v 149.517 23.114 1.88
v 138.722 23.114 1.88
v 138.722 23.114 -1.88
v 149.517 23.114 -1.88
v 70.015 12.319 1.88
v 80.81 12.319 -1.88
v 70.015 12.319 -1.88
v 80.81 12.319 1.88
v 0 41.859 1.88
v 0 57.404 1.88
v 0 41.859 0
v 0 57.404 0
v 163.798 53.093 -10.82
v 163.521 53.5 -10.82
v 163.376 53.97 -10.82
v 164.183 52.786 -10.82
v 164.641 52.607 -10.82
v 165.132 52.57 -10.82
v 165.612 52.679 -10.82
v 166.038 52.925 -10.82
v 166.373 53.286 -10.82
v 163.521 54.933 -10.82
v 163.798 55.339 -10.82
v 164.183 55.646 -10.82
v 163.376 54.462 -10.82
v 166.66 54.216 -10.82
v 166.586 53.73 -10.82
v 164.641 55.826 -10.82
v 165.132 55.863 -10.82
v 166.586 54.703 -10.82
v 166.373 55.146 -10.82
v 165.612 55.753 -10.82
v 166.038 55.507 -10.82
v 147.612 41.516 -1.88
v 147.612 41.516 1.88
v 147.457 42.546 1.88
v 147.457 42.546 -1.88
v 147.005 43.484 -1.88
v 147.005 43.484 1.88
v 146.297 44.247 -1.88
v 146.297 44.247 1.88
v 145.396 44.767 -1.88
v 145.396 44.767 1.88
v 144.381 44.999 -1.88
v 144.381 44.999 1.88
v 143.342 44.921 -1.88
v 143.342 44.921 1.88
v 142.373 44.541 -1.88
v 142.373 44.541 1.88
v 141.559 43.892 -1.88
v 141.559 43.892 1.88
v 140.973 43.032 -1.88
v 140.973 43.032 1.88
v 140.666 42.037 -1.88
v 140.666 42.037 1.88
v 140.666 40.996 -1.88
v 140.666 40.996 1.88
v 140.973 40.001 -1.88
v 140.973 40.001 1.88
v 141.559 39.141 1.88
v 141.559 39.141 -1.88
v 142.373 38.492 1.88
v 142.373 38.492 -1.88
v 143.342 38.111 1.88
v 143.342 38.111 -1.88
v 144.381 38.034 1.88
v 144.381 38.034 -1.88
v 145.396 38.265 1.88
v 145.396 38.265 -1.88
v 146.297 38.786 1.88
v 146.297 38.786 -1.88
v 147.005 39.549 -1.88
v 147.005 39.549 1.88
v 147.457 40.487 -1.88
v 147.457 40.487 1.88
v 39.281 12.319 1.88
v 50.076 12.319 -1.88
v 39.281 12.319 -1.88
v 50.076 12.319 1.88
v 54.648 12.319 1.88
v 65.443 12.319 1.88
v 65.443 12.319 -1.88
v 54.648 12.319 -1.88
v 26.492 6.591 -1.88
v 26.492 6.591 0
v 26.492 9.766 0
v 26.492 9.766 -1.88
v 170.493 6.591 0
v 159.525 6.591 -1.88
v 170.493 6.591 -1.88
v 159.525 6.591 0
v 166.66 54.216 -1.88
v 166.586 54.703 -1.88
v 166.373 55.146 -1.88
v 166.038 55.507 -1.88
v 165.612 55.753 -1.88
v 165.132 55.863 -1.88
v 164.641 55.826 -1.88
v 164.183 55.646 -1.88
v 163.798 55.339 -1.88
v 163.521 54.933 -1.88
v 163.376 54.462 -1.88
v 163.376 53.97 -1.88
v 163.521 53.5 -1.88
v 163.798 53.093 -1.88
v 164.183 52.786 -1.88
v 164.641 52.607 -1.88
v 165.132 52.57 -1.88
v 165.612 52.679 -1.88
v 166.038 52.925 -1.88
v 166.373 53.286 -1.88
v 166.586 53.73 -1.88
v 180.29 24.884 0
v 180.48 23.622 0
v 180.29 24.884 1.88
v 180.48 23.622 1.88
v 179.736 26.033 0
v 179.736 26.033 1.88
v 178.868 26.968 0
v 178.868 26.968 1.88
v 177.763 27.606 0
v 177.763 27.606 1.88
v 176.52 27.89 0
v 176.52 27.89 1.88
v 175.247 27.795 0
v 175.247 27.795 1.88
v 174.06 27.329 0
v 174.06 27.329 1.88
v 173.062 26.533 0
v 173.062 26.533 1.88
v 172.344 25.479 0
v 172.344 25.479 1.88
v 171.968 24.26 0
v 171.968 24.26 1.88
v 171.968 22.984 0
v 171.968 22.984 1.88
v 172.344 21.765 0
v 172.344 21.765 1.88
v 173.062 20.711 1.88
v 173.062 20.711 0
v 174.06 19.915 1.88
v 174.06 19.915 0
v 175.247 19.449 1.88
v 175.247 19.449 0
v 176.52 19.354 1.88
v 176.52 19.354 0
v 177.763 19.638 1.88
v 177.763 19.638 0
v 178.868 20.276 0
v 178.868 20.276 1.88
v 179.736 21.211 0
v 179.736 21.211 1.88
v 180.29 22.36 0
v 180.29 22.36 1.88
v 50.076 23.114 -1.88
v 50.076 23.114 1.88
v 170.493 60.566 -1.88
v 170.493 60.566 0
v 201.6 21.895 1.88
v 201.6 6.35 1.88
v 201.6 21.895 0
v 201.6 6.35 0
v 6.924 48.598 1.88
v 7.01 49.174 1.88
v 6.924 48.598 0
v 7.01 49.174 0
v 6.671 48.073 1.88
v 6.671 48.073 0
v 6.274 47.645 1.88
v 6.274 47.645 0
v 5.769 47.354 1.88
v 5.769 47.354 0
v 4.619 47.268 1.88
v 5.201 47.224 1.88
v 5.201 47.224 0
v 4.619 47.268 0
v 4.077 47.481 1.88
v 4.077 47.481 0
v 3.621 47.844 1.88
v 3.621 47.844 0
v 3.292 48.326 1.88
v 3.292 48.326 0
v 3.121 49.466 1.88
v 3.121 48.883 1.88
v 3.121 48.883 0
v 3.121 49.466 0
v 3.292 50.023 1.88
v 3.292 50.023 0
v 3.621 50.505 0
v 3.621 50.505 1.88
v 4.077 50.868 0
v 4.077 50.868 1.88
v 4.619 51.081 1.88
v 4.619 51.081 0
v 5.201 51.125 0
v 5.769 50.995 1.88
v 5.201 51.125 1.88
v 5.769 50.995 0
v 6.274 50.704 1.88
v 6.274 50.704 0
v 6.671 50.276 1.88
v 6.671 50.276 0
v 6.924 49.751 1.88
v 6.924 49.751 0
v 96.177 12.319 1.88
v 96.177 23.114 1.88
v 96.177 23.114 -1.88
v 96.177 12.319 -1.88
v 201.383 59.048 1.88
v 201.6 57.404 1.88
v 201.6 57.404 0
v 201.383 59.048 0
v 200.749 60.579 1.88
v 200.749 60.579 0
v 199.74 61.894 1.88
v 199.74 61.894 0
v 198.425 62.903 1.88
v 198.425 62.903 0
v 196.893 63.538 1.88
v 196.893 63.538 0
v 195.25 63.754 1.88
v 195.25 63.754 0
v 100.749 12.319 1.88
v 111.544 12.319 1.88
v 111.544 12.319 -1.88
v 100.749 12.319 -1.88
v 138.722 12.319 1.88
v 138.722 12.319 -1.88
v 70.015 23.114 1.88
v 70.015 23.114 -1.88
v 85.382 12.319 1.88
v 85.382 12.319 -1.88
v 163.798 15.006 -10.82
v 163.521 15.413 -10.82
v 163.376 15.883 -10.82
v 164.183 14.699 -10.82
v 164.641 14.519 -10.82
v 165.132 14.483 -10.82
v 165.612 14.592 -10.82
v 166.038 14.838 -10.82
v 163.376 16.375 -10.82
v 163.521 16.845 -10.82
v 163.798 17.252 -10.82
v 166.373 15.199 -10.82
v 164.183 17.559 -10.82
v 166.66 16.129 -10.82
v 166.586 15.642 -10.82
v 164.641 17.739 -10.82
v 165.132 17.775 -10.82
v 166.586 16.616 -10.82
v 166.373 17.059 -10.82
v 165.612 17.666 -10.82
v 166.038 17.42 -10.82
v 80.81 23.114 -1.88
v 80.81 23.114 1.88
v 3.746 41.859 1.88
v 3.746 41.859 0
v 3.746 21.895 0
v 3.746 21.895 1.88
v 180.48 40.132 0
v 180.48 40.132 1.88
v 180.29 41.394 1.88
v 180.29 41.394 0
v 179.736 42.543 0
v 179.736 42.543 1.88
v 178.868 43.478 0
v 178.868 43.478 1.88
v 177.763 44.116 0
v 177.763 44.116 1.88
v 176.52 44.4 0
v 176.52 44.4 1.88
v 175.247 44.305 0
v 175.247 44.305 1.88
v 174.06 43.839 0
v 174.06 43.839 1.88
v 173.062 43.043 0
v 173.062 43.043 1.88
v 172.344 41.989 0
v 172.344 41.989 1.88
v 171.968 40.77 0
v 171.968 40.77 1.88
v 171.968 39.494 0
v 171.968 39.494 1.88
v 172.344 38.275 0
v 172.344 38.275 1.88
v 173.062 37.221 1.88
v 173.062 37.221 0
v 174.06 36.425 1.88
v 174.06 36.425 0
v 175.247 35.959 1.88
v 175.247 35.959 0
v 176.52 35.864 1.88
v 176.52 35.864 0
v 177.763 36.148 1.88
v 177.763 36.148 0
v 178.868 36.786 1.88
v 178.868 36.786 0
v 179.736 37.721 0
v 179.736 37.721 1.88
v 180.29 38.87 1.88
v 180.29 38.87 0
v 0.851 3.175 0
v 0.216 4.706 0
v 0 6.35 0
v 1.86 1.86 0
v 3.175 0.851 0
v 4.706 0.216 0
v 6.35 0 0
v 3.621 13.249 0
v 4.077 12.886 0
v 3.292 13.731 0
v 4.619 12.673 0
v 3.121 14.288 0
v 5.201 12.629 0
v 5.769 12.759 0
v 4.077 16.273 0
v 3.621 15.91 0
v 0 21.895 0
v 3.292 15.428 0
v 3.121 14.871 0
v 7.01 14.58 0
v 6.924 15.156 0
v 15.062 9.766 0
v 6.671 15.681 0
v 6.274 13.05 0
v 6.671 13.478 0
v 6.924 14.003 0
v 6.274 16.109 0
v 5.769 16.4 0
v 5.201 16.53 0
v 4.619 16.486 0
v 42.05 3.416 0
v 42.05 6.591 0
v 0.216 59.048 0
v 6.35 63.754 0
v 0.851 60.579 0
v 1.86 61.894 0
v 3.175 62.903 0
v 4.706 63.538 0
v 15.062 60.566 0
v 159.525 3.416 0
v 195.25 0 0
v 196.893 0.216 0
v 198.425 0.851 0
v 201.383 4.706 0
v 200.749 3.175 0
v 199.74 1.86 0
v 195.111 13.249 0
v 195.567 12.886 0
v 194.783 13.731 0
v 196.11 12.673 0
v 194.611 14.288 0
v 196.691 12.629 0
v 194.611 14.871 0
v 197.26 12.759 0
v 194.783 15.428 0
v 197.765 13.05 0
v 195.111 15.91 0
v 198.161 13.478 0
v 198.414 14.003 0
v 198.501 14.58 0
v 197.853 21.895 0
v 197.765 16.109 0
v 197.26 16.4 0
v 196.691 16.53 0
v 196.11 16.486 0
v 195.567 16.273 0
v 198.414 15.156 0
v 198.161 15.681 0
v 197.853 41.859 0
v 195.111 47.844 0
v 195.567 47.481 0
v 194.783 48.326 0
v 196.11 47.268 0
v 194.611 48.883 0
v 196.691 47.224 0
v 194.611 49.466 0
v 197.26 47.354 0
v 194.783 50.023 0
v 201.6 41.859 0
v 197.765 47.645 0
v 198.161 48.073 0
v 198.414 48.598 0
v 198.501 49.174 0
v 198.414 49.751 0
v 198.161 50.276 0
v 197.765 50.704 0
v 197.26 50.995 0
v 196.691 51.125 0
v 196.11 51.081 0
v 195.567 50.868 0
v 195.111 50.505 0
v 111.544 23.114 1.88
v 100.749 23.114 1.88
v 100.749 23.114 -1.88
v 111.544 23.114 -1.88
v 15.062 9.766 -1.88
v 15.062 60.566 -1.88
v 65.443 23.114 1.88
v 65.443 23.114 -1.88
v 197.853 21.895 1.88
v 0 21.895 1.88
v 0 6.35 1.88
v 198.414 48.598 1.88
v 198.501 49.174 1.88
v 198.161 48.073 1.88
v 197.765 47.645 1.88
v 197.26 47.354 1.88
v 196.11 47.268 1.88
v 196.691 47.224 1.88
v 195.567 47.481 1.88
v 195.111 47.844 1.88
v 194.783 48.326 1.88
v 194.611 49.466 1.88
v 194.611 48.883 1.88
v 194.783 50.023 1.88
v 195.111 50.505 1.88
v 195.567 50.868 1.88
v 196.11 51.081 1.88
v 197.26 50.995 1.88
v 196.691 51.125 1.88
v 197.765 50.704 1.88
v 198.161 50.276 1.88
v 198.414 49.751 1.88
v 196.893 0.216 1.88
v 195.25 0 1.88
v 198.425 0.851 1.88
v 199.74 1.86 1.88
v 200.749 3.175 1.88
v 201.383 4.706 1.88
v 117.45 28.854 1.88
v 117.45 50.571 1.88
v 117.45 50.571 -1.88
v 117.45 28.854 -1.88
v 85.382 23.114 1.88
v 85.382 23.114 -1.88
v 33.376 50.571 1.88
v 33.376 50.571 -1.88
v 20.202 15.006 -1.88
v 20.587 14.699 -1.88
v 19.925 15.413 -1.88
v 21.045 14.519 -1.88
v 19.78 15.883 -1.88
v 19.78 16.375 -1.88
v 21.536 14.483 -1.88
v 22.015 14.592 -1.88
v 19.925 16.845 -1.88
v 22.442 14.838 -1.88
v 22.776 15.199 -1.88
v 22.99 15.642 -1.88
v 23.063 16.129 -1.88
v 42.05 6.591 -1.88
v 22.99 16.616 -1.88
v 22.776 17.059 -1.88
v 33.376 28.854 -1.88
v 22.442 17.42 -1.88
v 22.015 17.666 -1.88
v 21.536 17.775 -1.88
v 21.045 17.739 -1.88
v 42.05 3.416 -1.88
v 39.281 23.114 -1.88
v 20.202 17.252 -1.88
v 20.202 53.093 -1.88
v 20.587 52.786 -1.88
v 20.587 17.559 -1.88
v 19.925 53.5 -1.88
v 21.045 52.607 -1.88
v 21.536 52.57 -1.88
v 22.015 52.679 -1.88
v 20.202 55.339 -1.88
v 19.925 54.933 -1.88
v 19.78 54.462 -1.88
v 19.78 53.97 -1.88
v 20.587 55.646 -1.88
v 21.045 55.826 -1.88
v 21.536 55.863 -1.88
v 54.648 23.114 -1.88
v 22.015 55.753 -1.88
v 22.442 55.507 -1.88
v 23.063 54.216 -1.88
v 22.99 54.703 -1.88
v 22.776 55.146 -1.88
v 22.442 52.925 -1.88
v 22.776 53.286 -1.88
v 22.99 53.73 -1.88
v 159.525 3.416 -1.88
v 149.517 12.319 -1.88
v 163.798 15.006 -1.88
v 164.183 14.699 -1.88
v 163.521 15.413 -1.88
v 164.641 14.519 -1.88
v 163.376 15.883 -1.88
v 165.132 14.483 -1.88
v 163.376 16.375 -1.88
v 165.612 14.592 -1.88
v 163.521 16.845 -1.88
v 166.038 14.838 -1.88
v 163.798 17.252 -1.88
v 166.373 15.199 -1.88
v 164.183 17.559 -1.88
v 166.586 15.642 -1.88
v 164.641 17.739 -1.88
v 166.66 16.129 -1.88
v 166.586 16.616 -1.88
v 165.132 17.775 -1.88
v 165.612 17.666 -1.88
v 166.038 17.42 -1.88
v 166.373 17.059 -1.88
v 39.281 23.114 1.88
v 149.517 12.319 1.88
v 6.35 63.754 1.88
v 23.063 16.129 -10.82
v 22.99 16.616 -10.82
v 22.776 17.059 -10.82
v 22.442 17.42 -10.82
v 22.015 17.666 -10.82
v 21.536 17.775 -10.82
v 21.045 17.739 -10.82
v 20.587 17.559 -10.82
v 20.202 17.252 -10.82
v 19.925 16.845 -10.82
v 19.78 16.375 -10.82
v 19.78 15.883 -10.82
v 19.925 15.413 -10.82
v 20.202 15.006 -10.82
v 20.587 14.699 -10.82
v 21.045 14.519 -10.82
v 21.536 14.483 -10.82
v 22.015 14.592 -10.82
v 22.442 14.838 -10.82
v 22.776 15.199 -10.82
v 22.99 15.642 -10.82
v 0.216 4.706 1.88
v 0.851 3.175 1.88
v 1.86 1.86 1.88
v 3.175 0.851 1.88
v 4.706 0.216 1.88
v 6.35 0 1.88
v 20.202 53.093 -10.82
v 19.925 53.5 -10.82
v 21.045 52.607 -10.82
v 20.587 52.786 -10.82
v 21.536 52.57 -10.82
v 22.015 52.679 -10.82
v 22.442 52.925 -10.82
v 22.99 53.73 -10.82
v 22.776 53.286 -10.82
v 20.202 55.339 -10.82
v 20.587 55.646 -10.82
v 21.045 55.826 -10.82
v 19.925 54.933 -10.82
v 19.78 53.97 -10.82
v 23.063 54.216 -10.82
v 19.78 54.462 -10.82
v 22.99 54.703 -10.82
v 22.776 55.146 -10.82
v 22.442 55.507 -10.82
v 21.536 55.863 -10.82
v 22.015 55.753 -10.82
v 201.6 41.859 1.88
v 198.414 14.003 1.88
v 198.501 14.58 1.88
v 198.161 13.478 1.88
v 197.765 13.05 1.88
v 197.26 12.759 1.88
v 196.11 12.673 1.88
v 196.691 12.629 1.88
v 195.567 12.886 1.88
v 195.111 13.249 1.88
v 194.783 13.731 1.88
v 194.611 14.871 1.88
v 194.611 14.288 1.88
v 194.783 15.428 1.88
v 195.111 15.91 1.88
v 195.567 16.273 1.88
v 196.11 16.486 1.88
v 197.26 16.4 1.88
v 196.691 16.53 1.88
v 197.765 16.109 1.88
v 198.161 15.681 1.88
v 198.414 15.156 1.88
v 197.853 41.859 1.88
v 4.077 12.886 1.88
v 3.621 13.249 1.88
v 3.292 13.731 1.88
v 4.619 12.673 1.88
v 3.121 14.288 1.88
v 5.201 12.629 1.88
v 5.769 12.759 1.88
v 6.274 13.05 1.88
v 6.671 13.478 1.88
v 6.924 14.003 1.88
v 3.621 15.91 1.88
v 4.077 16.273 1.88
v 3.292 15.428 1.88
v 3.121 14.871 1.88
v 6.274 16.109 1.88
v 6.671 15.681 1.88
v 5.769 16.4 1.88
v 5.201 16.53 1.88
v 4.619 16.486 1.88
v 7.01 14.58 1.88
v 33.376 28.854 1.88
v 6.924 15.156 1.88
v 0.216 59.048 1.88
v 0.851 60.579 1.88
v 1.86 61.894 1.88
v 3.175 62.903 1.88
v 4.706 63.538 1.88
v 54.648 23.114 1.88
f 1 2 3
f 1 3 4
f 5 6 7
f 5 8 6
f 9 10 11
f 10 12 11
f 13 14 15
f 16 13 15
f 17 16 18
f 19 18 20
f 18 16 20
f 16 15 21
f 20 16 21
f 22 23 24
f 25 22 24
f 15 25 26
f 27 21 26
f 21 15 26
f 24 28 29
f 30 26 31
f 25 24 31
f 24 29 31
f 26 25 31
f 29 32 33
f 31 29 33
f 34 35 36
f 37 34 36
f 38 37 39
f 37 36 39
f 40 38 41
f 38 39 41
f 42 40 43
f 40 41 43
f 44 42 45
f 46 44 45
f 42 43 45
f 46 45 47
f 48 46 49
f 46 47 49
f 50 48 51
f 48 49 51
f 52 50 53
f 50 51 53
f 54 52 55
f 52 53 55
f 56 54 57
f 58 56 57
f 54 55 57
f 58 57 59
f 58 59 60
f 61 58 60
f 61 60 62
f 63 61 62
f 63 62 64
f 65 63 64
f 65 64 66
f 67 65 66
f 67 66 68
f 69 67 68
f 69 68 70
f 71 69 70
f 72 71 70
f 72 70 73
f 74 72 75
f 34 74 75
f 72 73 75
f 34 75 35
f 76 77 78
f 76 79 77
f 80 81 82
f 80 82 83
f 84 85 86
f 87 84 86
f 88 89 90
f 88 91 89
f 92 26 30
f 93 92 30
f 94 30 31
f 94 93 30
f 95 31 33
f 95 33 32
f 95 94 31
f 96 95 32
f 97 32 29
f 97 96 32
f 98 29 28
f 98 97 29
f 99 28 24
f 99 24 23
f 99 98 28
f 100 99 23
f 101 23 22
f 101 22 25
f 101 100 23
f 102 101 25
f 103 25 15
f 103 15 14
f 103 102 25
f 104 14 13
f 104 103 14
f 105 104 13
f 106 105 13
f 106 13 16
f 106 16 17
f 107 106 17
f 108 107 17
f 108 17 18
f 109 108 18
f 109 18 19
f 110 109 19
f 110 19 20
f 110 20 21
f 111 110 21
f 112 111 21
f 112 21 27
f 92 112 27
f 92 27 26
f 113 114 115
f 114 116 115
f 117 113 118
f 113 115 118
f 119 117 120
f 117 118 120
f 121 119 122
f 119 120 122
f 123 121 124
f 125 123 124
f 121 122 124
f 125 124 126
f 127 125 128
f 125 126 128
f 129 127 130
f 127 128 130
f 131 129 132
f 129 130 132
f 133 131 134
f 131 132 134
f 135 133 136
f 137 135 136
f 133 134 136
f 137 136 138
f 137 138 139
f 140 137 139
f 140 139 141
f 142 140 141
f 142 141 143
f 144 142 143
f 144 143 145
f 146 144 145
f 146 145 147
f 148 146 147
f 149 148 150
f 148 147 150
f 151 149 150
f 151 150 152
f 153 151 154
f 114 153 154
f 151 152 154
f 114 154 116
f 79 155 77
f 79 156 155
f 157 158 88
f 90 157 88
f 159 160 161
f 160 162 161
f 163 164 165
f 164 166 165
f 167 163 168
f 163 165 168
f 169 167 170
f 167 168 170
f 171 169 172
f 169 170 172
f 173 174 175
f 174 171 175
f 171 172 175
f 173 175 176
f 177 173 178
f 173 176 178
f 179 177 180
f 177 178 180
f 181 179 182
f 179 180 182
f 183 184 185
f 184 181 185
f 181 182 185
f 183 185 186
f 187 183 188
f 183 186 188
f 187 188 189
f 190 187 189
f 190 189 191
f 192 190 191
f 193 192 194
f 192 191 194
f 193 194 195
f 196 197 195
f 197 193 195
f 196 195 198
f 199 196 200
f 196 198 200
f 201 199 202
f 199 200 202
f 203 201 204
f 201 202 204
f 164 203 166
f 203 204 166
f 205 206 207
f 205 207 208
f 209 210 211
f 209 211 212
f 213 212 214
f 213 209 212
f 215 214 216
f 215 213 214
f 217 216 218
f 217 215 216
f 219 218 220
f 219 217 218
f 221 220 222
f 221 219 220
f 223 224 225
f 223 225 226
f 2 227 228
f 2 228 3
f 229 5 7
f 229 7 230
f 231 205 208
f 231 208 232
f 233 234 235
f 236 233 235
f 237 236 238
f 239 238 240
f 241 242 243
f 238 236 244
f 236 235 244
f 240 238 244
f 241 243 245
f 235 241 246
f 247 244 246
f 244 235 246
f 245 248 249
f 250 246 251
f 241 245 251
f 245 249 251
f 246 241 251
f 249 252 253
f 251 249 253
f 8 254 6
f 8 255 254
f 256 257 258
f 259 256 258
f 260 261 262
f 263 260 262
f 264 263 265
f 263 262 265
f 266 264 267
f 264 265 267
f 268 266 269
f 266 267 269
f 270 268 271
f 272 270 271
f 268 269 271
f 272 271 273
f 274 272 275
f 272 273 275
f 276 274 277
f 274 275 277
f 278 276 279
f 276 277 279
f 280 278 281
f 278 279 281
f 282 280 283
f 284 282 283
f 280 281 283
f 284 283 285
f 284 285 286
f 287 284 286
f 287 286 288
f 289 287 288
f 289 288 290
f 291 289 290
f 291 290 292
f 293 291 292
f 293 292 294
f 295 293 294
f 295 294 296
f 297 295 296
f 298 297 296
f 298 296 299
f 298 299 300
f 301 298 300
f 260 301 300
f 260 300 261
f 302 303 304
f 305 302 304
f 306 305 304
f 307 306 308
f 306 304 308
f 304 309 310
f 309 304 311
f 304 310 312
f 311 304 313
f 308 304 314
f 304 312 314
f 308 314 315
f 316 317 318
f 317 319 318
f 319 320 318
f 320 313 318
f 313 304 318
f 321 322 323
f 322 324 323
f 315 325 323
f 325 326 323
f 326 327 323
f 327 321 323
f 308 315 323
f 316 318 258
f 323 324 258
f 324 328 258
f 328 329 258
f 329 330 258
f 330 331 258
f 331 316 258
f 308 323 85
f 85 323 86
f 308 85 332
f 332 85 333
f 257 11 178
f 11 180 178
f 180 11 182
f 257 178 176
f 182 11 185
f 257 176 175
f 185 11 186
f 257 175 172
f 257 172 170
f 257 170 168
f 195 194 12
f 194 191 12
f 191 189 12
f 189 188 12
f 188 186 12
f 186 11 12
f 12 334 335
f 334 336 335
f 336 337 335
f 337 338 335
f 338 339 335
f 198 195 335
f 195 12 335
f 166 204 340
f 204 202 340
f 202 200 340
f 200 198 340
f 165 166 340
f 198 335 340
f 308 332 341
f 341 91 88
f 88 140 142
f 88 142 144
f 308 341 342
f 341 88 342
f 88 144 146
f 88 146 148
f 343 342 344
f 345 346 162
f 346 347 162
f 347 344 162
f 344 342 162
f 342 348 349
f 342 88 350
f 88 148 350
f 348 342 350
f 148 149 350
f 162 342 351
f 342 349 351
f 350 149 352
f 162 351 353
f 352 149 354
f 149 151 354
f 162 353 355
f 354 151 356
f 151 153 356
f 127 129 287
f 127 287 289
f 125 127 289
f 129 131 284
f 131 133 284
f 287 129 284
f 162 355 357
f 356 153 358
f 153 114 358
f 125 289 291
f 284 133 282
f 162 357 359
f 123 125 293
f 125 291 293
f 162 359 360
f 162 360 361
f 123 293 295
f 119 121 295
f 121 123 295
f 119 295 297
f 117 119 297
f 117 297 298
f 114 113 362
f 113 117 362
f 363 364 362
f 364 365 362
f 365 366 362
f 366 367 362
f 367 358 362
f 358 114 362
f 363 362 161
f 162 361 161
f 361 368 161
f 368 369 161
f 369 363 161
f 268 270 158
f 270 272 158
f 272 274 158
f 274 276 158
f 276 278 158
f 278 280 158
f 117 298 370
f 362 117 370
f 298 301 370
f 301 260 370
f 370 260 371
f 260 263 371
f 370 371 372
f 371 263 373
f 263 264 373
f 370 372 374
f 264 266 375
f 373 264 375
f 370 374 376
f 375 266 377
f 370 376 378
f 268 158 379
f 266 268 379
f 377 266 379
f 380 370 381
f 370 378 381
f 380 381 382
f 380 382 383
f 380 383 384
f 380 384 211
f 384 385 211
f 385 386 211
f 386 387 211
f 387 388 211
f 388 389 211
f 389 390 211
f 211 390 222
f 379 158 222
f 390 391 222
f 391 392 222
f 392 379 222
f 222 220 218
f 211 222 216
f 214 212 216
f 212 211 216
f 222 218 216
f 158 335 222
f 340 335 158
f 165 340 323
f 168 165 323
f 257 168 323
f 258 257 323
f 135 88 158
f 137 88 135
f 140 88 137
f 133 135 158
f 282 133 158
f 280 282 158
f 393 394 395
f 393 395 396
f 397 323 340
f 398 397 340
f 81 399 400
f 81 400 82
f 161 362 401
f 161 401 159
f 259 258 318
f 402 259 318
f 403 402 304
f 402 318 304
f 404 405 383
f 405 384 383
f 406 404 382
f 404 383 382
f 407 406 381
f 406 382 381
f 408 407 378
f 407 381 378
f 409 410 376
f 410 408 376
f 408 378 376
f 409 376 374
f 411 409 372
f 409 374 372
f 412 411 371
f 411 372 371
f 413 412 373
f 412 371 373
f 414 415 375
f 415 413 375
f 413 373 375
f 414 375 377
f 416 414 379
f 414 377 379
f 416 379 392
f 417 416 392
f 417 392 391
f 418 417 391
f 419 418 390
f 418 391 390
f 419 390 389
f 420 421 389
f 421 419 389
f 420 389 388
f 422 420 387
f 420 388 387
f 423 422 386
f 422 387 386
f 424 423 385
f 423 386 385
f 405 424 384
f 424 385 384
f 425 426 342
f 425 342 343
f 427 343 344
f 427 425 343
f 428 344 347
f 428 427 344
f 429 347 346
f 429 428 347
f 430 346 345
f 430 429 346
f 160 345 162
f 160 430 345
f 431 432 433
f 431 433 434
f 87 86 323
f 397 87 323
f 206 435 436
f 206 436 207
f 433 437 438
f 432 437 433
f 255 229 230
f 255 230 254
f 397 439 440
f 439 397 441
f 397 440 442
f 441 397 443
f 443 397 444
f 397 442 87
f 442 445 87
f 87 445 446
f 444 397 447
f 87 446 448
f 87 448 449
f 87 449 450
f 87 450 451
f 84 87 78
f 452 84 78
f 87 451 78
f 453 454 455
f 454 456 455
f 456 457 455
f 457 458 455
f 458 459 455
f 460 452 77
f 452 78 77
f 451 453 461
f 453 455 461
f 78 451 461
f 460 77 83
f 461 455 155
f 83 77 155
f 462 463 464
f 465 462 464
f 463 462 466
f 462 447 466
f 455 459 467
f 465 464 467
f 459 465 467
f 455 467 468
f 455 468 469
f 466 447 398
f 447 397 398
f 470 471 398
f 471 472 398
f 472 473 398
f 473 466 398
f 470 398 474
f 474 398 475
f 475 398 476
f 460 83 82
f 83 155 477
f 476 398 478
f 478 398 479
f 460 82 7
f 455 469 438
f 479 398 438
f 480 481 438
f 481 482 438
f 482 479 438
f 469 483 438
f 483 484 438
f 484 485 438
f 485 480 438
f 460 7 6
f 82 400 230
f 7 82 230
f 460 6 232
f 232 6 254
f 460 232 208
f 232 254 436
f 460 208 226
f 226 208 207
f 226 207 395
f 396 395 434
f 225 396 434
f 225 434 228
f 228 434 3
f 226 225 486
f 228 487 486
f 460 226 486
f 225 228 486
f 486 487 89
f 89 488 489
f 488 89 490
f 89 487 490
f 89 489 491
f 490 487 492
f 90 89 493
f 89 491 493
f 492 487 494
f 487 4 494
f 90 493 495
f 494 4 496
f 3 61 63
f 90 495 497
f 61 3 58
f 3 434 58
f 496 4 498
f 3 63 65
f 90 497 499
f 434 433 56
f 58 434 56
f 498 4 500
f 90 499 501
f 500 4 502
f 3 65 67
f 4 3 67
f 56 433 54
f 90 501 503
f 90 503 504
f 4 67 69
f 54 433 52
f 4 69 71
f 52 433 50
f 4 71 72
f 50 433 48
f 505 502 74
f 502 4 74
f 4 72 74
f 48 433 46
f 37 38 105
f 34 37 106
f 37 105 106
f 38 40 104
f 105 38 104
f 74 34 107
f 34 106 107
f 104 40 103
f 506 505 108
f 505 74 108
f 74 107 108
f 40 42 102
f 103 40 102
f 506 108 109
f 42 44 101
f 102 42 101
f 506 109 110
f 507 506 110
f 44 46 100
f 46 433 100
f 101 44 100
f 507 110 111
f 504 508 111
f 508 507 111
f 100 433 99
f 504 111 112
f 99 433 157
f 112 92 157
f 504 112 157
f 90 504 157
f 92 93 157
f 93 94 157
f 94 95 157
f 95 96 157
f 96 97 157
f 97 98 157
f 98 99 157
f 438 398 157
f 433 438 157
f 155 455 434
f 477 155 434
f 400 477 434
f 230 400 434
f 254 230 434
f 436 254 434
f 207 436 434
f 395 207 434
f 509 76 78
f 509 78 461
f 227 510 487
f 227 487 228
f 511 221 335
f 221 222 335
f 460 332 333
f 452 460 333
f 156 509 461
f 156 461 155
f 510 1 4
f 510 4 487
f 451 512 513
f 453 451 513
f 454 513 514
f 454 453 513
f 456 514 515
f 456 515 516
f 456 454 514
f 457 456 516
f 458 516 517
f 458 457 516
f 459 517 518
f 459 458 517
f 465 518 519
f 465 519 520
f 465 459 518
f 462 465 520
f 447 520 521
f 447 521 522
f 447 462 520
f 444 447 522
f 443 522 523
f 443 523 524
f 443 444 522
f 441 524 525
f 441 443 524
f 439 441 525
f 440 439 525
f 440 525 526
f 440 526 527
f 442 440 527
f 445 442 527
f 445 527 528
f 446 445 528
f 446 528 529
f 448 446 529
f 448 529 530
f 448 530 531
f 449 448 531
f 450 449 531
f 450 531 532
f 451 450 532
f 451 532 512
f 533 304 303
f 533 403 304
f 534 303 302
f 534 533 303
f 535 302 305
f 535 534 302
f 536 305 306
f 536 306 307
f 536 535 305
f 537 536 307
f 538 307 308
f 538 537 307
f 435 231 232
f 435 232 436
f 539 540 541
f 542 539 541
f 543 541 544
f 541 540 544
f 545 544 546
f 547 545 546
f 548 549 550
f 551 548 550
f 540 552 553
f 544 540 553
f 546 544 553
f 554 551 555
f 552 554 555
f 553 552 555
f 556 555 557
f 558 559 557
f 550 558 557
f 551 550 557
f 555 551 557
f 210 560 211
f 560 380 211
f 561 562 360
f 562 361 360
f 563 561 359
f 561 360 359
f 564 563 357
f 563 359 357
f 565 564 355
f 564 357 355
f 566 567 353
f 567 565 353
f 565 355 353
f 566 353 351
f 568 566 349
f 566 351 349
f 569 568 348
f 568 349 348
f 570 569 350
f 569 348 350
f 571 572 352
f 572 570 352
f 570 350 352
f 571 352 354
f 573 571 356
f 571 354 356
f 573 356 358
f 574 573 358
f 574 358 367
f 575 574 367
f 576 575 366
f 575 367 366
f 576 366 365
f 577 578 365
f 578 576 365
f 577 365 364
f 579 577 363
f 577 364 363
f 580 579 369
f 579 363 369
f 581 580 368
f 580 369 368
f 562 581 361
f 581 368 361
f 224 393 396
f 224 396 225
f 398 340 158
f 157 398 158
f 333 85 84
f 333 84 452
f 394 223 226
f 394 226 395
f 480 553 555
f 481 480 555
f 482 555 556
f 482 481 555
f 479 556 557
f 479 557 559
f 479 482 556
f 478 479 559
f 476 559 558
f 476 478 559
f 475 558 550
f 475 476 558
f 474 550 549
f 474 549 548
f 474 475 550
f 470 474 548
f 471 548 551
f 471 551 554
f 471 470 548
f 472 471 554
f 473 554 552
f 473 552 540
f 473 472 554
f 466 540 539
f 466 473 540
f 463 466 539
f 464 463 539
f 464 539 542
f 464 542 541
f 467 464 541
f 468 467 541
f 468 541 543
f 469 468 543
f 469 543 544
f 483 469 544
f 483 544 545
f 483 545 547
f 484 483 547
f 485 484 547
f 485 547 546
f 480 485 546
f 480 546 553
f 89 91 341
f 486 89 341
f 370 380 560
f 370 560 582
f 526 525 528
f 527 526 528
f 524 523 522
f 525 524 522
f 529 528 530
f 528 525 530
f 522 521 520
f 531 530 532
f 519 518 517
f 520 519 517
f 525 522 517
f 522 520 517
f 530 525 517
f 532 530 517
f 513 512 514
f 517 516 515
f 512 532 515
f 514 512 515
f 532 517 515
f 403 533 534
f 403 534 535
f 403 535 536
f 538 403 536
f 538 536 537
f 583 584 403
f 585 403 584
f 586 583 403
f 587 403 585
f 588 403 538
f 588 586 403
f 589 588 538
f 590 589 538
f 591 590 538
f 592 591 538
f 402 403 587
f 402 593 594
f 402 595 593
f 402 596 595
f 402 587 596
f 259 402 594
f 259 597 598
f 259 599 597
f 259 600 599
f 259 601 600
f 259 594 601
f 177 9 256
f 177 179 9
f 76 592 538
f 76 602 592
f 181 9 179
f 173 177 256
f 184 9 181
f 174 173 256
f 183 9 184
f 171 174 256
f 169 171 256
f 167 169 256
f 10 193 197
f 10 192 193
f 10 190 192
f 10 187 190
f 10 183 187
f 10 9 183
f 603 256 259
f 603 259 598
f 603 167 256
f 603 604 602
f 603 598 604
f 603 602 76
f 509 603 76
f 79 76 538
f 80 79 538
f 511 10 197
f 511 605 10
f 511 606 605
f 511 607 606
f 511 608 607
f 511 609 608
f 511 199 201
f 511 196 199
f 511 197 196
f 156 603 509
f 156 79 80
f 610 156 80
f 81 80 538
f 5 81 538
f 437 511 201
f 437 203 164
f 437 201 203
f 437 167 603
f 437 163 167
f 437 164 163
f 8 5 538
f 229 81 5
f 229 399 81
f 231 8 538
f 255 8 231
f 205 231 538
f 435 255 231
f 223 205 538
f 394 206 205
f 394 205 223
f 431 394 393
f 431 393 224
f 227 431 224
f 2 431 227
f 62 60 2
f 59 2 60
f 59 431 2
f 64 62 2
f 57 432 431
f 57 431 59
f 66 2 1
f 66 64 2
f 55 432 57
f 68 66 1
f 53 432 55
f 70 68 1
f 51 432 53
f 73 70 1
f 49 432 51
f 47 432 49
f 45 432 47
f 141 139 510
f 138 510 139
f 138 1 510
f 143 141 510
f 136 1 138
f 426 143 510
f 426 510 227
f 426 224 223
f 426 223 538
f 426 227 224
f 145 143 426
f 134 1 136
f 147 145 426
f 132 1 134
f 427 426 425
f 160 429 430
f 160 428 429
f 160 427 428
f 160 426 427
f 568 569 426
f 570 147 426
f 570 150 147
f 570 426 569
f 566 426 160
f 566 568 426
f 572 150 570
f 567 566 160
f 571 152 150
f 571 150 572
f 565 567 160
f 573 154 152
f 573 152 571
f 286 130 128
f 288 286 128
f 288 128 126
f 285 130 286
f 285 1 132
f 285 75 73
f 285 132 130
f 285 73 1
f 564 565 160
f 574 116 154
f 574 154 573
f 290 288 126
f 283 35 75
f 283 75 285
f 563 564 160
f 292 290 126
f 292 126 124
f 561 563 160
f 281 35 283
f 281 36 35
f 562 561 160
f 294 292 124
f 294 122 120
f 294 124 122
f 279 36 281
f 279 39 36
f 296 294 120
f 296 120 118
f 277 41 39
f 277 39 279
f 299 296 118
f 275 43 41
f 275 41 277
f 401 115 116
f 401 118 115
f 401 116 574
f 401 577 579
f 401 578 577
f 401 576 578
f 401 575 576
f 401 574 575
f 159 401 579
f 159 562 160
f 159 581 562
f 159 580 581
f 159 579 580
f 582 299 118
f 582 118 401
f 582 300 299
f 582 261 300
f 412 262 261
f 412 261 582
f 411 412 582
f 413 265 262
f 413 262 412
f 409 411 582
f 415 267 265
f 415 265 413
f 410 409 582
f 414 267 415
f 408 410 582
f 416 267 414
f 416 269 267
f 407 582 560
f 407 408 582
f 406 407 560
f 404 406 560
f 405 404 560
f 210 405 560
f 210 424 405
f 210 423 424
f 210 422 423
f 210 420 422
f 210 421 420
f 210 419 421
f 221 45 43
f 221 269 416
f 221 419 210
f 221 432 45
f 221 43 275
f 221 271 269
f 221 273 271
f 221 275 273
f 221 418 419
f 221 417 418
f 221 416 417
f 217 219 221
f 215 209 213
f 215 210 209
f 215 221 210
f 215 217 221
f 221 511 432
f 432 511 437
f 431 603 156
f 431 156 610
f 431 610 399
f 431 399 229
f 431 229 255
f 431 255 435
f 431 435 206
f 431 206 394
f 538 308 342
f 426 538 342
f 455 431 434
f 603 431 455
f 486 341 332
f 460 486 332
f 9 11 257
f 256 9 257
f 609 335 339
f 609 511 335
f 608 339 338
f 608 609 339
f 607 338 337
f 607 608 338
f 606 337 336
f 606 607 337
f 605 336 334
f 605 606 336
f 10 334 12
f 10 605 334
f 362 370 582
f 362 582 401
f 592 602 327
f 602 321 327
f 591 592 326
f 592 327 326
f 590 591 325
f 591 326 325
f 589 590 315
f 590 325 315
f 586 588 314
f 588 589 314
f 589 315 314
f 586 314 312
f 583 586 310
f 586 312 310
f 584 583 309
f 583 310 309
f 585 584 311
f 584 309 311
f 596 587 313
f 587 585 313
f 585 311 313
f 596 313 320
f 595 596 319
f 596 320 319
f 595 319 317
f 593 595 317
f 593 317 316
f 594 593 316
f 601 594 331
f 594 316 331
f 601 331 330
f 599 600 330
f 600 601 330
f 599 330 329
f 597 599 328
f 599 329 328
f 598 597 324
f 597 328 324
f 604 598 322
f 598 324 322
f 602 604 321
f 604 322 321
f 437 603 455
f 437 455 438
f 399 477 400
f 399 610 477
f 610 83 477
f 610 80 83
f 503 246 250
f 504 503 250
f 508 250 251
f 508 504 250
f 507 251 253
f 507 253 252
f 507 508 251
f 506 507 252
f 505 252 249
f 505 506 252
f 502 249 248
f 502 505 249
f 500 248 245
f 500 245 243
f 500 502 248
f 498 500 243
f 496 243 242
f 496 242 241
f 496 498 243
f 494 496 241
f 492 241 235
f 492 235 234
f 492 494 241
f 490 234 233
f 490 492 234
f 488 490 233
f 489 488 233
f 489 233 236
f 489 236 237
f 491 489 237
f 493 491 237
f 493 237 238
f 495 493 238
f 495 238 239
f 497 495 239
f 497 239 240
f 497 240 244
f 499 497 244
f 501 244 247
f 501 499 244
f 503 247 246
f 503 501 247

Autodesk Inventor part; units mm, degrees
ref_plane "YZ Plane" through (0, 0, 0) normal (1, 0, 0) x (0, 1, 0)
ref_plane "XZ Plane" through (0, 0, 0) normal (0, 1, 0) x (-1, 0, 0)
ref_plane "XY Plane" through (0, 0, 0) normal (0, 0, 1) x (1, 0, 0)
sketch "Sketch1" plane through (0, 0, 0) normal (0, 0, 1) x (1, 0, 0)
  line L0 (0, 0) -> (201.5998, 0)
  line L1 (201.5998, 0) -> (201.5998, 63.754)
  line L2 (201.5998, 63.754) -> (0, 63.754)
  line L3 (0, 63.754) -> (0, 0)
  line L4 (0, 41.8592) -> (3.7465, 41.8592)
  line L5 (3.7465, 41.8592) -> (3.7465, 21.8948)
  line L6 (3.7465, 21.8948) -> (0, 21.8948)
  line L7 (0, 21.8948) -> (0, 41.8592)
  line L8 (201.5998, 41.8592) -> (197.8533, 41.8592)
  line L9 (197.8533, 41.8592) -> (197.8533, 21.8948)
  line L10 (197.8533, 21.8948) -> (201.5998, 21.8948)
  line L11 (201.5998, 21.8948) -> (201.5998, 41.8592)
  circle A0 centre (5.0546, 49.1744) radius 1.9558
  circle A1 centre (5.0546, 14.5796) radius 1.9558
  circle A2 centre (196.5452, 14.5796) radius 1.9558
  circle A3 centre (196.5452, 49.1744) radius 1.9558
  dimension "d0" = 201.5998
  dimension "d1" = 63.754
  dimension "d2" = 3.7465
  dimension "d3" = 19.9644
  dimension "d4" = 21.8948
  dimension "d5" = 3.7465
  dimension "d6" = 3.9116
  dimension "d7" = 12.6238
  dimension "d8" = 3.0988
  dimension "d9" = 3.9116
  dimension "d10" = 12.6238
  dimension "d11" = 3.0988
  dimension "d12" = 3.9116
  dimension "d13" = 3.0988
extrude "Extrusion1" add sketch "Sketch1" along normal blind 1.8796 contours L3 L6 L5 L4 L2 L1 L8 L9 L10 L0
fillet "Fillet1" radius 6.35 4 edges at (201.5998, 63.754, 0.9398) (201.5998, 0, 0.9398) (0, 63.754, 0.9398) (0, 0, 0.9398)
sketch "Sketch2" plane through (0, 0, 1.8796) normal (0, 0, 1) x (1, 0, 0)
  arc A0 (0, 6.35) -> (6.35, 0) centre (6.35, 6.35) ccw projected
  line L0 (6.35, 0) -> (195.2498, 0) projected
  arc A1 (195.2498, 0) -> (201.5998, 6.35) centre (195.2498, 6.35) ccw projected
  line L1 (201.5998, 6.35) -> (201.5998, 21.8948) projected
  line L2 (201.5998, 21.8948) -> (197.8533, 21.8948) projected
  line L3 (197.8533, 21.8948) -> (197.8533, 41.8592) projected
  line L4 (197.8533, 41.8592) -> (201.5998, 41.8592) projected
  line L5 (201.5998, 41.8592) -> (201.5998, 57.404) projected
  arc A2 (201.5998, 57.404) -> (195.2498, 63.754) centre (195.2498, 57.404) ccw projected
  line L6 (195.2498, 63.754) -> (6.35, 63.754) projected
  arc A3 (6.35, 63.754) -> (0, 57.404) centre (6.35, 57.404) ccw projected
  line L7 (0, 57.404) -> (0, 41.8592) projected
  line L8 (0, 41.8592) -> (3.7465, 41.8592) projected
  line L9 (3.7465, 41.8592) -> (3.7465, 21.8948) projected
  line L10 (3.7465, 21.8948) -> (0, 21.8948) projected
  line L11 (0, 21.8948) -> (0, 6.35) projected
  circle A4 centre (196.5452, 49.1744) radius 1.9558 projected
  circle A5 centre (196.5452, 14.5796) radius 1.9558 projected
  circle A6 centre (5.0546, 14.5796) radius 1.9558 projected
  circle A7 centre (5.0546, 49.1744) radius 1.9558 projected
  line L12 (15.0622, 60.5663) -> (170.4927, 60.5663)
  line L13 (170.4927, 60.5663) -> (170.4927, 9.7663)
  line L14 (15.0622, 9.7663) -> (15.0622, 60.5663)
  line L15 (170.4927, 9.7663) -> (170.4927, 6.5913)
  line L16 (26.4922, 6.5913) -> (26.4922, 9.7663)
  line L17 (159.5247, 6.5913) -> (159.5247, 3.4163)
  line L18 (159.5247, 3.4163) -> (42.0497, 3.4163)
  line L19 (42.0497, 3.4163) -> (42.0497, 6.5913)
  circle A8 centre (21.4122, 54.2163) radius 1.651
  circle A9 centre (21.4122, 16.129) radius 1.651
  circle A10 centre (165.0087, 16.129) radius 1.651
  circle A11 centre (165.0087, 54.2163) radius 1.651
  line L20 (33.3756, 50.5714) -> (117.4496, 50.5714)
  line L21 (117.4496, 50.5714) -> (117.4496, 28.8544)
  line L22 (117.4496, 28.8544) -> (33.3756, 28.8544)
  line L23 (33.3756, 28.8544) -> (33.3756, 50.5714)
  line L24 (39.2811, 23.114) -> (50.0761, 23.114)
  line L25 (50.0761, 23.114) -> (50.0761, 12.319)
  line L26 (50.0761, 12.319) -> (39.2811, 12.319)
  line L27 (39.2811, 12.319) -> (39.2811, 23.114)
  line L28 (54.6481, 23.114) -> (65.4431, 23.114)
  line L29 (65.4431, 23.114) -> (65.4431, 12.319)
  line L30 (65.4431, 12.319) -> (54.6481, 12.319)
  line L31 (54.6481, 12.319) -> (54.6481, 23.114)
  line L32 (70.0151, 23.114) -> (80.8101, 23.114)
  line L33 (80.8101, 23.114) -> (80.8101, 12.319)
  line L34 (80.8101, 12.319) -> (70.0151, 12.319)
  line L35 (70.0151, 12.319) -> (70.0151, 23.114)
  line L36 (85.3821, 23.114) -> (96.1771, 23.114)
  line L37 (96.1771, 23.114) -> (96.1771, 12.319)
  line L38 (96.1771, 12.319) -> (85.3821, 12.319)
  line L39 (85.3821, 12.319) -> (85.3821, 23.114)
  line L40 (100.7491, 23.114) -> (111.5441, 23.114)
  line L41 (111.5441, 23.114) -> (111.5441, 12.319)
  line L42 (111.5441, 12.319) -> (100.7491, 12.319)
  line L43 (100.7491, 12.319) -> (100.7491, 23.114)
  line L44 (138.7221, 23.114) -> (149.5171, 23.114)
  line L45 (149.5171, 23.114) -> (149.5171, 12.319)
  line L46 (149.5171, 12.319) -> (138.7221, 12.319)
  line L47 (138.7221, 12.319) -> (138.7221, 23.114)
  line L48 (170.4927, 9.7663) -> (170.4927, 9.7663)
  line L49 (26.4922, 9.7663) -> (15.0622, 9.7663)
  line L50 (26.4922, 6.5913) -> (42.0497, 6.5913)
  line L51 (159.5247, 6.5913) -> (170.4927, 6.5913)
  circle A12 centre (176.1998, 40.132) radius 4.2799
  circle A13 centre (176.1998, 23.622) radius 4.2799
  circle A14 centre (144.1196, 41.5163) radius 3.4925
  line L52 (144.1196, 23.114) -> (144.1196, 12.319)
  point P0 (0, 0)
  dimension "d30" = 3.302
  dimension "d31" = 6.35
  dimension "d32" = 6.35
  dimension "d42" = 84.074
  dimension "d43" = 21.717
  dimension "d72" = 10.795
  dimension "d73" = 10.795
  dimension "d74" = 10.795
  dimension "d75" = 10.795
  dimension "d76" = 10.795
  dimension "d77" = 10.795
  dimension "d78" = 10.795
  dimension "d79" = 4.572
  dimension "d80" = 4.572
  dimension "d81" = 4.572
  dimension "d82" = 4.572
  dimension "d83" = 5.9055
  dimension "d84" = 5.9055
  dimension "d85" = 12.319
  dimension "d86" = 8.5598
  dimension "d87" = 8.5598
  dimension "d90" = 6.985
  dimension "d91" = 26.67
  dimension "d99" = 25.4
  dimension "d100" = 25.4
  dimension "d101" = 0
  dimension "d102" = 3.302
  dimension "d103" = 3.302
  dimension "d104" = 3.302
  dimension "d106" = 16.51
  dimension "d108" = 23.622
  dimension "d109" = 23.622
  dimension "d112" = 50.8
  dimension "d113" = 155.4305
  dimension "d114" = 6.35
extrude "Extrusion2" cut sketch "Sketch2" against normal blind 1.8796 contours A8 | A9 | A10 | A11 | L20 L21 L22 L23 | L24 L25 L26 L27 | L28 L29 L30 L31 | L32 L33 L34 L35 | L36 L37 L38 L39 | L40 L41 L42 L43 | L44 L52 L46 L47 | L44 L45 L46 L52 | A12 | A13 | A14
extrude "Extrusion3" add sketch "Sketch2" against normal blind 3.7592 contours L12 L13 L15 L51 L17 L18 L19 L50 L16 L49 L14
sketch "Sketch3" plane through (0, 0, 1.8796) normal (0, 0, 1) x (1, 0, 0)
  line L0 (138.7221, 12.319) -> (138.7221, 23.114) projected
  line L1 (138.7221, 23.114) -> (149.5171, 23.114) projected
  line L2 (149.5171, 23.114) -> (149.5171, 12.319) projected
  line L3 (149.5171, 12.319) -> (138.7221, 12.319) projected
  line L4 (85.3821, 12.319) -> (85.3821, 23.114) projected
  line L5 (85.3821, 23.114) -> (96.1771, 23.114) projected
  line L6 (96.1771, 23.114) -> (96.1771, 12.319) projected
  line L7 (96.1771, 12.319) -> (85.3821, 12.319) projected
  line L8 (54.6481, 12.319) -> (54.6481, 23.114) projected
  line L9 (54.6481, 23.114) -> (65.4431, 23.114) projected
  line L10 (65.4431, 23.114) -> (65.4431, 12.319) projected
  line L11 (65.4431, 12.319) -> (54.6481, 12.319) projected
  circle A0 centre (144.1196, 41.5163) radius 3.4925 projected
  circle A1 centre (165.0087, 16.129) radius 1.651 projected
  circle A2 centre (21.4122, 54.2163) radius 1.651 projected
  circle A3 centre (21.4122, 16.129) radius 1.651 projected
  circle A4 centre (165.0087, 54.2163) radius 1.651 projected
  line L12 (39.2811, 12.319) -> (39.2811, 23.114) projected
  line L13 (39.2811, 23.114) -> (50.0761, 23.114) projected
  line L14 (50.0761, 23.114) -> (50.0761, 12.319) projected
  line L15 (50.0761, 12.319) -> (39.2811, 12.319) projected
  line L16 (70.0151, 12.319) -> (70.0151, 23.114) projected
  line L17 (70.0151, 23.114) -> (80.8101, 23.114) projected
  line L18 (80.8101, 23.114) -> (80.8101, 12.319) projected
  line L19 (80.8101, 12.319) -> (70.0151, 12.319) projected
  line L20 (100.7491, 12.319) -> (100.7491, 23.114) projected
  line L21 (100.7491, 23.114) -> (111.5441, 23.114) projected
  line L22 (111.5441, 23.114) -> (111.5441, 12.319) projected
  line L23 (111.5441, 12.319) -> (100.7491, 12.319) projected
  line L24 (33.3756, 28.8544) -> (33.3756, 50.5714) projected
  line L25 (33.3756, 50.5714) -> (117.4496, 50.5714) projected
  line L26 (117.4496, 50.5714) -> (117.4496, 28.8544) projected
  line L27 (117.4496, 28.8544) -> (33.3756, 28.8544) projected
  circle A5 centre (176.1998, 23.622) radius 4.2799 projected
  circle A6 centre (176.1998, 40.132) radius 4.2799 projected
  arc A7 (0, 6.35) -> (6.35, 0) centre (6.35, 6.35) ccw projected
  line L28 (6.35, 0) -> (195.2498, 0) projected
  arc A8 (195.2498, 0) -> (201.5998, 6.35) centre (195.2498, 6.35) ccw projected
  line L29 (201.5998, 6.35) -> (201.5998, 21.8948) projected
  line L30 (201.5998, 21.8948) -> (197.8533, 21.8948) projected
  line L31 (197.8533, 21.8948) -> (197.8533, 41.8592) projected
  line L32 (197.8533, 41.8592) -> (201.5998, 41.8592) projected
  line L33 (201.5998, 41.8592) -> (201.5998, 57.404) projected
  arc A9 (201.5998, 57.404) -> (195.2498, 63.754) centre (195.2498, 57.404) ccw projected
  line L34 (195.2498, 63.754) -> (6.35, 63.754) projected
  arc A10 (6.35, 63.754) -> (0, 57.404) centre (6.35, 57.404) ccw projected
  line L35 (0, 57.404) -> (0, 41.8592) projected
  line L36 (0, 41.8592) -> (3.7465, 41.8592) projected
  line L37 (3.7465, 41.8592) -> (3.7465, 21.8948) projected
  line L38 (3.7465, 21.8948) -> (0, 21.8948) projected
  line L39 (0, 21.8948) -> (0, 6.35) projected
  circle A11 centre (196.5452, 49.1744) radius 1.9558 projected
  circle A12 centre (196.5452, 14.5796) radius 1.9558 projected
  circle A13 centre (5.0546, 14.5796) radius 1.9558 projected
  circle A14 centre (5.0546, 49.1744) radius 1.9558 projected
  circle A15 centre (21.4122, 54.2163) radius 1.651 projected
  line L40 (15.0622, 60.5663) -> (170.4927, 60.5663) projected
  line L41 (138.7221, 12.319) -> (138.7221, 23.114) projected
  line L42 (138.7221, 23.114) -> (149.5171, 23.114) projected
  line L43 (149.5171, 23.114) -> (149.5171, 12.319) projected
  line L44 (149.5171, 12.319) -> (138.7221, 12.319) projected
  line L45 (85.3821, 12.319) -> (85.3821, 23.114) projected
  line L46 (85.3821, 23.114) -> (96.1771, 23.114) projected
  line L47 (96.1771, 23.114) -> (96.1771, 12.319) projected
  line L48 (96.1771, 12.319) -> (85.3821, 12.319) projected
  line L49 (54.6481, 12.319) -> (54.6481, 23.114) projected
  line L50 (54.6481, 23.114) -> (65.4431, 23.114) projected
  line L51 (65.4431, 23.114) -> (65.4431, 12.319) projected
  line L52 (65.4431, 12.319) -> (54.6481, 12.319) projected
  circle A16 centre (144.1196, 41.5163) radius 3.4925 projected
  circle A17 centre (165.0087, 16.129) radius 1.651 projected
  circle A18 centre (21.4122, 54.2163) radius 1.651 projected
  circle A19 centre (21.4122, 16.129) radius 1.651 projected
  circle A20 centre (165.0087, 54.2163) radius 1.651 projected
  line L53 (39.2811, 12.319) -> (39.2811, 23.114) projected
  line L54 (39.2811, 23.114) -> (50.0761, 23.114) projected
  line L55 (50.0761, 23.114) -> (50.0761, 12.319) projected
  line L56 (50.0761, 12.319) -> (39.2811, 12.319) projected
  line L57 (70.0151, 12.319) -> (70.0151, 23.114) projected
  line L58 (70.0151, 23.114) -> (80.8101, 23.114) projected
  line L59 (80.8101, 23.114) -> (80.8101, 12.319) projected
  line L60 (80.8101, 12.319) -> (70.0151, 12.319) projected
  line L61 (100.7491, 12.319) -> (100.7491, 23.114) projected
  line L62 (100.7491, 23.114) -> (111.5441, 23.114) projected
  line L63 (111.5441, 23.114) -> (111.5441, 12.319) projected
  line L64 (111.5441, 12.319) -> (100.7491, 12.319) projected
  line L65 (33.3756, 28.8544) -> (33.3756, 50.5714) projected
  line L66 (33.3756, 50.5714) -> (117.4496, 50.5714) projected
  line L67 (117.4496, 50.5714) -> (117.4496, 28.8544) projected
  line L68 (117.4496, 28.8544) -> (33.3756, 28.8544) projected
  circle A21 centre (176.1998, 23.622) radius 4.2799 projected
  circle A22 centre (176.1998, 40.132) radius 4.2799 projected
  arc A23 (0, 6.35) -> (6.35, 0) centre (6.35, 6.35) ccw projected
  line L69 (6.35, 0) -> (195.2498, 0) projected
  arc A24 (195.2498, 0) -> (201.5998, 6.35) centre (195.2498, 6.35) ccw projected
  line L70 (201.5998, 6.35) -> (201.5998, 21.8948) projected
  line L71 (201.5998, 21.8948) -> (197.8533, 21.8948) projected
  line L72 (197.8533, 21.8948) -> (197.8533, 41.8592) projected
  line L73 (197.8533, 41.8592) -> (201.5998, 41.8592) projected
  line L74 (201.5998, 41.8592) -> (201.5998, 57.404) projected
  arc A25 (201.5998, 57.404) -> (195.2498, 63.754) centre (195.2498, 57.404) ccw projected
  line L75 (195.2498, 63.754) -> (6.35, 63.754) projected
  arc A26 (6.35, 63.754) -> (0, 57.404) centre (6.35, 57.404) ccw projected
  line L76 (0, 57.404) -> (0, 41.8592) projected
  line L77 (0, 41.8592) -> (3.7465, 41.8592) projected
  line L78 (3.7465, 41.8592) -> (3.7465, 21.8948) projected
  line L79 (3.7465, 21.8948) -> (0, 21.8948) projected
  line L80 (0, 21.8948) -> (0, 6.35) projected
  circle A27 centre (196.5452, 49.1744) radius 1.9558 projected
  circle A28 centre (196.5452, 14.5796) radius 1.9558 projected
  circle A29 centre (5.0546, 14.5796) radius 1.9558 projected
  circle A30 centre (5.0546, 49.1744) radius 1.9558 projected
  circle A31 centre (21.4122, 54.2163) radius 1.651
  circle A32 centre (21.4122, 16.129) radius 1.651
  circle A33 centre (165.0087, 16.129) radius 1.651
  circle A34 centre (165.0087, 54.2163) radius 1.651
  point P0 (0, 0)
extrude "Extrusion4" add sketch "Sketch3" against normal blind 12.7 contours A1 | A2 | A3 | A4
properties part number "Front Pannel"
